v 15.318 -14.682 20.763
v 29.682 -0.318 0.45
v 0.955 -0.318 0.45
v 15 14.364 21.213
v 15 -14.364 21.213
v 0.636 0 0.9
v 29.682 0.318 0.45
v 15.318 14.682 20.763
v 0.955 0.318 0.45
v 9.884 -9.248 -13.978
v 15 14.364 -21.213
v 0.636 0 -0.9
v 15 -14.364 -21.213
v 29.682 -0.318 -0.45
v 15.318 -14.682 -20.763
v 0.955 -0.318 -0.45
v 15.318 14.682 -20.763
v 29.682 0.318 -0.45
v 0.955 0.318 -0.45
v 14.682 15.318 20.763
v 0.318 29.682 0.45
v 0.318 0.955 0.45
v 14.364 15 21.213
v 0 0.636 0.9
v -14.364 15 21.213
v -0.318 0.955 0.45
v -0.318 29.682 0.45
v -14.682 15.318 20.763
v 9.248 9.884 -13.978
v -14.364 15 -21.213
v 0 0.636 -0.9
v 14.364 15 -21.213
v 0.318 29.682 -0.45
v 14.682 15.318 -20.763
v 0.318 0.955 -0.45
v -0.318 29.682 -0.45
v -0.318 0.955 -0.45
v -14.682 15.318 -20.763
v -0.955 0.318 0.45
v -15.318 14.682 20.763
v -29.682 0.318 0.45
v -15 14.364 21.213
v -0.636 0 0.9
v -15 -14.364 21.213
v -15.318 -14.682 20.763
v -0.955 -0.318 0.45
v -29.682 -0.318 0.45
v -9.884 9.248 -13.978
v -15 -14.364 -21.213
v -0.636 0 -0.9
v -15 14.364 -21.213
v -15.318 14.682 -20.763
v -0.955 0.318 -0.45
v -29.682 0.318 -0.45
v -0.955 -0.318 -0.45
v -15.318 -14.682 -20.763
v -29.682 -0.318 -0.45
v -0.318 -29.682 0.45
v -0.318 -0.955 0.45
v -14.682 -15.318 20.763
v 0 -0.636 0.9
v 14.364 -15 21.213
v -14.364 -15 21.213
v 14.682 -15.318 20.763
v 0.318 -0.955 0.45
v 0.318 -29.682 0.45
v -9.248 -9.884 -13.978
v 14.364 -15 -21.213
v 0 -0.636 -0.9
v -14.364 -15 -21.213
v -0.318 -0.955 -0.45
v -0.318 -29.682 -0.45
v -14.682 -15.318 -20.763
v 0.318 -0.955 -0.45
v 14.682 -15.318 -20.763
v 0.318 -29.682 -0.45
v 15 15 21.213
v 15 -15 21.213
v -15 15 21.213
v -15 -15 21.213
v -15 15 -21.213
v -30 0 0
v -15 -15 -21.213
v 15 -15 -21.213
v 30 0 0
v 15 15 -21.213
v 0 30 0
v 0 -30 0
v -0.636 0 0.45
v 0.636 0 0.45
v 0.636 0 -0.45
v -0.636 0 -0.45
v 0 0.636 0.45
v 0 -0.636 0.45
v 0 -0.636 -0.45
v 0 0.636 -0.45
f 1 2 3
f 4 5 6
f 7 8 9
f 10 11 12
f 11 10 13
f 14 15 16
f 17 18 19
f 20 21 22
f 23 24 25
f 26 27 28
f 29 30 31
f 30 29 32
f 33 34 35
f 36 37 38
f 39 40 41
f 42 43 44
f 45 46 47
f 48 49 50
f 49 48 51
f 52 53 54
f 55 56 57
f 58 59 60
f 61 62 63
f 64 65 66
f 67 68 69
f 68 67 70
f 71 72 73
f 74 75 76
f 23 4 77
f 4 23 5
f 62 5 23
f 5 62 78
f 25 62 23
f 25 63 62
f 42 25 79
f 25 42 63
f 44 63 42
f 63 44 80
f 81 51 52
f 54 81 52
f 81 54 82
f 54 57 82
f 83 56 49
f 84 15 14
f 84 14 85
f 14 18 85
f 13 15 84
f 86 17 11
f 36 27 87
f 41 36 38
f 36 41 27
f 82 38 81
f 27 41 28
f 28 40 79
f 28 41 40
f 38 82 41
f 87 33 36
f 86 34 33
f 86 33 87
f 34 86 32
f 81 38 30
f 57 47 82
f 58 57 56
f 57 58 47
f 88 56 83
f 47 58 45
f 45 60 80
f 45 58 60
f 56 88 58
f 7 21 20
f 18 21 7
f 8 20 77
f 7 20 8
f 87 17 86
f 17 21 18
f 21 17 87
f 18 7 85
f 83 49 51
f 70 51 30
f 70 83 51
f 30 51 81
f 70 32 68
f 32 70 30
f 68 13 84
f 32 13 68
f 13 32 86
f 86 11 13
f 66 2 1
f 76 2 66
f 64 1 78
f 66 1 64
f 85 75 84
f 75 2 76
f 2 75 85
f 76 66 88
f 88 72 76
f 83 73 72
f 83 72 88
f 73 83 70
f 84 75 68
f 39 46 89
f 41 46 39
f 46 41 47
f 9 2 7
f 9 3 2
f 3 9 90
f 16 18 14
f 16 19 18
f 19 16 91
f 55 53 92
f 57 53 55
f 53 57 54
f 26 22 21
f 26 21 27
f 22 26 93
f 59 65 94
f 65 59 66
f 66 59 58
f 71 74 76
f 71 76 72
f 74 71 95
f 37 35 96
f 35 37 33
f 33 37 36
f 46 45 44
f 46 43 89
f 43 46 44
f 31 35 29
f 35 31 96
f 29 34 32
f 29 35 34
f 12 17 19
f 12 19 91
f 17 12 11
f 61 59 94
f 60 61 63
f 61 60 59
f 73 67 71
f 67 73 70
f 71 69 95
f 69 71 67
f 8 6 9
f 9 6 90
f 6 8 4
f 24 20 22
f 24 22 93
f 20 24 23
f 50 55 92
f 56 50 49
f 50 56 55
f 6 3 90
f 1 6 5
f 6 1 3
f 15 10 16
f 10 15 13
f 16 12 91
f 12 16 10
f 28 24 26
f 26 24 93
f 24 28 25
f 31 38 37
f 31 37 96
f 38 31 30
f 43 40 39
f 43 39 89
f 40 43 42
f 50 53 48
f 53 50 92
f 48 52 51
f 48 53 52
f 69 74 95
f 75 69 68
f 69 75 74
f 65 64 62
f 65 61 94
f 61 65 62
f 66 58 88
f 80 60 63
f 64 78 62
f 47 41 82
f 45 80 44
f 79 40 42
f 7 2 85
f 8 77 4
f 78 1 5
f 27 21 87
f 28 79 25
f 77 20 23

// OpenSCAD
// Approximation of Stewart polyhedra B4,3 and B4,4
//  (aka. the octahemioctahedron and cubohemioctahedron)
//
// Bill Owens   March 16, 2014
//
// The designation B4,3 is from _Adventures Among the Toroids_ by Professor Bonnie M.
// Stewart; he described the shape in Chapter II, Exercise 2 as an example of a 
// polyhedron that can only be modeled in 3-space if its faces are allowed to 
// intersect each other. It is based on the familiar cuboctahedron (which he called B4)
// with the square faces removed and four hexagon faces added.
// 
// The similar polyhedron B4,4 has the triangular faces removed; unlike B4,3 it
// is non-orientable.
//
// This is only an approximation of the polyhedron since the true shape 
// isn't manifold and can't be rendered correctly. 
// The inward-facing triangle faces are actually one-sixth of hexagon faces that 
// intersect with each other, so in order to make the model manifold I 
// built it out of eight regular tetrahedra and added small fillets along each 
// intersection line.
//
// Note that although the script allows a choice of printing on a solid or hollow side,
// the B4,3 model is printable without support only on the hollow side, and B4,4 only
// on the solid side. Both are likely to need fixup with Netfabb, Meshlab or the like
// before they can be sliced.
//
// The vertices and faces for the cuboctahedron came from pdragy's Customizable Convex Polyhedra
// <http://www.thingiverse.com/thing:233540>, 
// which in turn drew from pmoews' polyhedra designs
// <http://www.thingiverse.com/thing:16508>,
// and George Hart's VRML versions 
// <http://www.georgehart.com/virtual-polyhedra/vp.html>  
// In keeping with the previous sources, this code is released under the 
// Creative Commons - Attribution - Share Alike license (CC-BY-SA).

// for Thingiverse Customizer

/* Global */

// Polyhedron B4,3, B4,4 or plain B4
poly = "B44"; // [B43,B44,B4]

// Length of one edge of the object (mm)
size = 30;

// Size of the fillet block (mm)
fsize = 0.03;

// Printing orientation
orientation = "solid"; // [solid:On a solid side,hollow:On a hollow side]

/* Hidden */
s2 = 1/sqrt(2);

module onetetra() {
polyhedron(
	points = [
		[0,0,0],				//0
		[1,0,0],				//1
		[0.5,0.5,s2],	//2
		[0.5,-0.5,s2]	//3
	],
	triangles = [
		[0,3,1],
		[1,3,2],
		[0,2,3],
		[0,1,2]
	]);
}

module twotetra() {
union() {
	onetetra();
	rotate(90,[1,1,0]) onetetra();
}
}

module cuboctahedron() {        // cuboctahedron points and triangles from pdragy, tweaked to use
polyhedron(                     // a more accurate sqrt(2) value.
	points = [
        [  -1,   0,   0],
        [  -0.5,  -0.5,  -s2],
        [  -0.5,  -0.5,   s2],
        [  -0.5,   0.5,  -s2],
        [  -0.5,   0.5,   s2],
        [   0,  -1,   0],
        [   0,   1,   0],
        [   0.5,  -0.5,  -s2],
        [   0.5,  -0.5,   s2],
        [   0.5,   0.5,  -s2],
        [   0.5,   0.5,   s2],
        [   1,   0,   0],
   ],
   triangles = [
        [    0,    2,    1],[    0,    3,    4],
        [    0,    4,    2],[    0,    1,    3],
        [    4,    3,    6],[    1,    2,    5],
        [   11,    7,    8],[   11,   10,    9],
        [   11,    8,   10],[   11,    9,    7],
        [    6,    9,   10],[    5,    8,    7],
        [    2,    8,    5],[   10,    4,    6],
        [    9,    6,    3],[    7,    1,    5],
        [    9,    3,    7],[    7,    3,    1],
        [    2,   10,    8],[    2,    4,   10],
	]);
}

module fillet() {
intersection() {
	union() {
		cube([2,s2*fsize,fsize], center=true);      // produce rectangular fillets in six directions
		rotate(90,[0,0,1]) cube([2,s2*fsize,fsize], center=true);
		rotate([0,45,45]) cube([2,fsize,s2*fsize], center=true);
		rotate([0,-45,45]) cube([2,fsize,s2*fsize], center=true);
		rotate([0,45,-45]) cube([2,fsize,s2*fsize], center=true);
		rotate([0,-45,-45]) cube([2,fsize,s2*fsize], center=true);
	} 
	cuboctahedron();                                // trim their points to fit the finished shape
}
}

module B43() {
union() {
	twotetra();
	rotate(90,[0,0,1]) twotetra();
	rotate(180,[0,0,1]) twotetra();
	rotate(270,[0,0,1]) twotetra();
	fillet();
} 
}

module B44() {
union() {
	difference() {
		cuboctahedron();
		scale(1.0001) twotetra();       // the 1.0001 scale makes a clean cut out of the cuboctahedron
		scale(1.0001) rotate(90,[0,0,1]) twotetra();
		scale(1.0001) rotate(180,[0,0,1]) twotetra();
		scale(1.0001) rotate(270,[0,0,1]) twotetra();
	}
	fillet();
}
}

// Choose the polyhedron and decide whether the model should sit on a solid or 
// hollow side
if (poly == "B43") {
	if (orientation == "hollow") {
		scale(size) B43();
	} else {
		scale(size) rotate(90-atan(1/sqrt(2)),[1,0,0]) B43();
	}
} else if (poly == "B44") {
	if (orientation == "hollow") {
		scale(size) rotate(90-atan(1/sqrt(2)),[1,0,0]) B44();
	} else {
		scale(size) B44();
	}
} else {
	scale(size) cuboctahedron();	
}
